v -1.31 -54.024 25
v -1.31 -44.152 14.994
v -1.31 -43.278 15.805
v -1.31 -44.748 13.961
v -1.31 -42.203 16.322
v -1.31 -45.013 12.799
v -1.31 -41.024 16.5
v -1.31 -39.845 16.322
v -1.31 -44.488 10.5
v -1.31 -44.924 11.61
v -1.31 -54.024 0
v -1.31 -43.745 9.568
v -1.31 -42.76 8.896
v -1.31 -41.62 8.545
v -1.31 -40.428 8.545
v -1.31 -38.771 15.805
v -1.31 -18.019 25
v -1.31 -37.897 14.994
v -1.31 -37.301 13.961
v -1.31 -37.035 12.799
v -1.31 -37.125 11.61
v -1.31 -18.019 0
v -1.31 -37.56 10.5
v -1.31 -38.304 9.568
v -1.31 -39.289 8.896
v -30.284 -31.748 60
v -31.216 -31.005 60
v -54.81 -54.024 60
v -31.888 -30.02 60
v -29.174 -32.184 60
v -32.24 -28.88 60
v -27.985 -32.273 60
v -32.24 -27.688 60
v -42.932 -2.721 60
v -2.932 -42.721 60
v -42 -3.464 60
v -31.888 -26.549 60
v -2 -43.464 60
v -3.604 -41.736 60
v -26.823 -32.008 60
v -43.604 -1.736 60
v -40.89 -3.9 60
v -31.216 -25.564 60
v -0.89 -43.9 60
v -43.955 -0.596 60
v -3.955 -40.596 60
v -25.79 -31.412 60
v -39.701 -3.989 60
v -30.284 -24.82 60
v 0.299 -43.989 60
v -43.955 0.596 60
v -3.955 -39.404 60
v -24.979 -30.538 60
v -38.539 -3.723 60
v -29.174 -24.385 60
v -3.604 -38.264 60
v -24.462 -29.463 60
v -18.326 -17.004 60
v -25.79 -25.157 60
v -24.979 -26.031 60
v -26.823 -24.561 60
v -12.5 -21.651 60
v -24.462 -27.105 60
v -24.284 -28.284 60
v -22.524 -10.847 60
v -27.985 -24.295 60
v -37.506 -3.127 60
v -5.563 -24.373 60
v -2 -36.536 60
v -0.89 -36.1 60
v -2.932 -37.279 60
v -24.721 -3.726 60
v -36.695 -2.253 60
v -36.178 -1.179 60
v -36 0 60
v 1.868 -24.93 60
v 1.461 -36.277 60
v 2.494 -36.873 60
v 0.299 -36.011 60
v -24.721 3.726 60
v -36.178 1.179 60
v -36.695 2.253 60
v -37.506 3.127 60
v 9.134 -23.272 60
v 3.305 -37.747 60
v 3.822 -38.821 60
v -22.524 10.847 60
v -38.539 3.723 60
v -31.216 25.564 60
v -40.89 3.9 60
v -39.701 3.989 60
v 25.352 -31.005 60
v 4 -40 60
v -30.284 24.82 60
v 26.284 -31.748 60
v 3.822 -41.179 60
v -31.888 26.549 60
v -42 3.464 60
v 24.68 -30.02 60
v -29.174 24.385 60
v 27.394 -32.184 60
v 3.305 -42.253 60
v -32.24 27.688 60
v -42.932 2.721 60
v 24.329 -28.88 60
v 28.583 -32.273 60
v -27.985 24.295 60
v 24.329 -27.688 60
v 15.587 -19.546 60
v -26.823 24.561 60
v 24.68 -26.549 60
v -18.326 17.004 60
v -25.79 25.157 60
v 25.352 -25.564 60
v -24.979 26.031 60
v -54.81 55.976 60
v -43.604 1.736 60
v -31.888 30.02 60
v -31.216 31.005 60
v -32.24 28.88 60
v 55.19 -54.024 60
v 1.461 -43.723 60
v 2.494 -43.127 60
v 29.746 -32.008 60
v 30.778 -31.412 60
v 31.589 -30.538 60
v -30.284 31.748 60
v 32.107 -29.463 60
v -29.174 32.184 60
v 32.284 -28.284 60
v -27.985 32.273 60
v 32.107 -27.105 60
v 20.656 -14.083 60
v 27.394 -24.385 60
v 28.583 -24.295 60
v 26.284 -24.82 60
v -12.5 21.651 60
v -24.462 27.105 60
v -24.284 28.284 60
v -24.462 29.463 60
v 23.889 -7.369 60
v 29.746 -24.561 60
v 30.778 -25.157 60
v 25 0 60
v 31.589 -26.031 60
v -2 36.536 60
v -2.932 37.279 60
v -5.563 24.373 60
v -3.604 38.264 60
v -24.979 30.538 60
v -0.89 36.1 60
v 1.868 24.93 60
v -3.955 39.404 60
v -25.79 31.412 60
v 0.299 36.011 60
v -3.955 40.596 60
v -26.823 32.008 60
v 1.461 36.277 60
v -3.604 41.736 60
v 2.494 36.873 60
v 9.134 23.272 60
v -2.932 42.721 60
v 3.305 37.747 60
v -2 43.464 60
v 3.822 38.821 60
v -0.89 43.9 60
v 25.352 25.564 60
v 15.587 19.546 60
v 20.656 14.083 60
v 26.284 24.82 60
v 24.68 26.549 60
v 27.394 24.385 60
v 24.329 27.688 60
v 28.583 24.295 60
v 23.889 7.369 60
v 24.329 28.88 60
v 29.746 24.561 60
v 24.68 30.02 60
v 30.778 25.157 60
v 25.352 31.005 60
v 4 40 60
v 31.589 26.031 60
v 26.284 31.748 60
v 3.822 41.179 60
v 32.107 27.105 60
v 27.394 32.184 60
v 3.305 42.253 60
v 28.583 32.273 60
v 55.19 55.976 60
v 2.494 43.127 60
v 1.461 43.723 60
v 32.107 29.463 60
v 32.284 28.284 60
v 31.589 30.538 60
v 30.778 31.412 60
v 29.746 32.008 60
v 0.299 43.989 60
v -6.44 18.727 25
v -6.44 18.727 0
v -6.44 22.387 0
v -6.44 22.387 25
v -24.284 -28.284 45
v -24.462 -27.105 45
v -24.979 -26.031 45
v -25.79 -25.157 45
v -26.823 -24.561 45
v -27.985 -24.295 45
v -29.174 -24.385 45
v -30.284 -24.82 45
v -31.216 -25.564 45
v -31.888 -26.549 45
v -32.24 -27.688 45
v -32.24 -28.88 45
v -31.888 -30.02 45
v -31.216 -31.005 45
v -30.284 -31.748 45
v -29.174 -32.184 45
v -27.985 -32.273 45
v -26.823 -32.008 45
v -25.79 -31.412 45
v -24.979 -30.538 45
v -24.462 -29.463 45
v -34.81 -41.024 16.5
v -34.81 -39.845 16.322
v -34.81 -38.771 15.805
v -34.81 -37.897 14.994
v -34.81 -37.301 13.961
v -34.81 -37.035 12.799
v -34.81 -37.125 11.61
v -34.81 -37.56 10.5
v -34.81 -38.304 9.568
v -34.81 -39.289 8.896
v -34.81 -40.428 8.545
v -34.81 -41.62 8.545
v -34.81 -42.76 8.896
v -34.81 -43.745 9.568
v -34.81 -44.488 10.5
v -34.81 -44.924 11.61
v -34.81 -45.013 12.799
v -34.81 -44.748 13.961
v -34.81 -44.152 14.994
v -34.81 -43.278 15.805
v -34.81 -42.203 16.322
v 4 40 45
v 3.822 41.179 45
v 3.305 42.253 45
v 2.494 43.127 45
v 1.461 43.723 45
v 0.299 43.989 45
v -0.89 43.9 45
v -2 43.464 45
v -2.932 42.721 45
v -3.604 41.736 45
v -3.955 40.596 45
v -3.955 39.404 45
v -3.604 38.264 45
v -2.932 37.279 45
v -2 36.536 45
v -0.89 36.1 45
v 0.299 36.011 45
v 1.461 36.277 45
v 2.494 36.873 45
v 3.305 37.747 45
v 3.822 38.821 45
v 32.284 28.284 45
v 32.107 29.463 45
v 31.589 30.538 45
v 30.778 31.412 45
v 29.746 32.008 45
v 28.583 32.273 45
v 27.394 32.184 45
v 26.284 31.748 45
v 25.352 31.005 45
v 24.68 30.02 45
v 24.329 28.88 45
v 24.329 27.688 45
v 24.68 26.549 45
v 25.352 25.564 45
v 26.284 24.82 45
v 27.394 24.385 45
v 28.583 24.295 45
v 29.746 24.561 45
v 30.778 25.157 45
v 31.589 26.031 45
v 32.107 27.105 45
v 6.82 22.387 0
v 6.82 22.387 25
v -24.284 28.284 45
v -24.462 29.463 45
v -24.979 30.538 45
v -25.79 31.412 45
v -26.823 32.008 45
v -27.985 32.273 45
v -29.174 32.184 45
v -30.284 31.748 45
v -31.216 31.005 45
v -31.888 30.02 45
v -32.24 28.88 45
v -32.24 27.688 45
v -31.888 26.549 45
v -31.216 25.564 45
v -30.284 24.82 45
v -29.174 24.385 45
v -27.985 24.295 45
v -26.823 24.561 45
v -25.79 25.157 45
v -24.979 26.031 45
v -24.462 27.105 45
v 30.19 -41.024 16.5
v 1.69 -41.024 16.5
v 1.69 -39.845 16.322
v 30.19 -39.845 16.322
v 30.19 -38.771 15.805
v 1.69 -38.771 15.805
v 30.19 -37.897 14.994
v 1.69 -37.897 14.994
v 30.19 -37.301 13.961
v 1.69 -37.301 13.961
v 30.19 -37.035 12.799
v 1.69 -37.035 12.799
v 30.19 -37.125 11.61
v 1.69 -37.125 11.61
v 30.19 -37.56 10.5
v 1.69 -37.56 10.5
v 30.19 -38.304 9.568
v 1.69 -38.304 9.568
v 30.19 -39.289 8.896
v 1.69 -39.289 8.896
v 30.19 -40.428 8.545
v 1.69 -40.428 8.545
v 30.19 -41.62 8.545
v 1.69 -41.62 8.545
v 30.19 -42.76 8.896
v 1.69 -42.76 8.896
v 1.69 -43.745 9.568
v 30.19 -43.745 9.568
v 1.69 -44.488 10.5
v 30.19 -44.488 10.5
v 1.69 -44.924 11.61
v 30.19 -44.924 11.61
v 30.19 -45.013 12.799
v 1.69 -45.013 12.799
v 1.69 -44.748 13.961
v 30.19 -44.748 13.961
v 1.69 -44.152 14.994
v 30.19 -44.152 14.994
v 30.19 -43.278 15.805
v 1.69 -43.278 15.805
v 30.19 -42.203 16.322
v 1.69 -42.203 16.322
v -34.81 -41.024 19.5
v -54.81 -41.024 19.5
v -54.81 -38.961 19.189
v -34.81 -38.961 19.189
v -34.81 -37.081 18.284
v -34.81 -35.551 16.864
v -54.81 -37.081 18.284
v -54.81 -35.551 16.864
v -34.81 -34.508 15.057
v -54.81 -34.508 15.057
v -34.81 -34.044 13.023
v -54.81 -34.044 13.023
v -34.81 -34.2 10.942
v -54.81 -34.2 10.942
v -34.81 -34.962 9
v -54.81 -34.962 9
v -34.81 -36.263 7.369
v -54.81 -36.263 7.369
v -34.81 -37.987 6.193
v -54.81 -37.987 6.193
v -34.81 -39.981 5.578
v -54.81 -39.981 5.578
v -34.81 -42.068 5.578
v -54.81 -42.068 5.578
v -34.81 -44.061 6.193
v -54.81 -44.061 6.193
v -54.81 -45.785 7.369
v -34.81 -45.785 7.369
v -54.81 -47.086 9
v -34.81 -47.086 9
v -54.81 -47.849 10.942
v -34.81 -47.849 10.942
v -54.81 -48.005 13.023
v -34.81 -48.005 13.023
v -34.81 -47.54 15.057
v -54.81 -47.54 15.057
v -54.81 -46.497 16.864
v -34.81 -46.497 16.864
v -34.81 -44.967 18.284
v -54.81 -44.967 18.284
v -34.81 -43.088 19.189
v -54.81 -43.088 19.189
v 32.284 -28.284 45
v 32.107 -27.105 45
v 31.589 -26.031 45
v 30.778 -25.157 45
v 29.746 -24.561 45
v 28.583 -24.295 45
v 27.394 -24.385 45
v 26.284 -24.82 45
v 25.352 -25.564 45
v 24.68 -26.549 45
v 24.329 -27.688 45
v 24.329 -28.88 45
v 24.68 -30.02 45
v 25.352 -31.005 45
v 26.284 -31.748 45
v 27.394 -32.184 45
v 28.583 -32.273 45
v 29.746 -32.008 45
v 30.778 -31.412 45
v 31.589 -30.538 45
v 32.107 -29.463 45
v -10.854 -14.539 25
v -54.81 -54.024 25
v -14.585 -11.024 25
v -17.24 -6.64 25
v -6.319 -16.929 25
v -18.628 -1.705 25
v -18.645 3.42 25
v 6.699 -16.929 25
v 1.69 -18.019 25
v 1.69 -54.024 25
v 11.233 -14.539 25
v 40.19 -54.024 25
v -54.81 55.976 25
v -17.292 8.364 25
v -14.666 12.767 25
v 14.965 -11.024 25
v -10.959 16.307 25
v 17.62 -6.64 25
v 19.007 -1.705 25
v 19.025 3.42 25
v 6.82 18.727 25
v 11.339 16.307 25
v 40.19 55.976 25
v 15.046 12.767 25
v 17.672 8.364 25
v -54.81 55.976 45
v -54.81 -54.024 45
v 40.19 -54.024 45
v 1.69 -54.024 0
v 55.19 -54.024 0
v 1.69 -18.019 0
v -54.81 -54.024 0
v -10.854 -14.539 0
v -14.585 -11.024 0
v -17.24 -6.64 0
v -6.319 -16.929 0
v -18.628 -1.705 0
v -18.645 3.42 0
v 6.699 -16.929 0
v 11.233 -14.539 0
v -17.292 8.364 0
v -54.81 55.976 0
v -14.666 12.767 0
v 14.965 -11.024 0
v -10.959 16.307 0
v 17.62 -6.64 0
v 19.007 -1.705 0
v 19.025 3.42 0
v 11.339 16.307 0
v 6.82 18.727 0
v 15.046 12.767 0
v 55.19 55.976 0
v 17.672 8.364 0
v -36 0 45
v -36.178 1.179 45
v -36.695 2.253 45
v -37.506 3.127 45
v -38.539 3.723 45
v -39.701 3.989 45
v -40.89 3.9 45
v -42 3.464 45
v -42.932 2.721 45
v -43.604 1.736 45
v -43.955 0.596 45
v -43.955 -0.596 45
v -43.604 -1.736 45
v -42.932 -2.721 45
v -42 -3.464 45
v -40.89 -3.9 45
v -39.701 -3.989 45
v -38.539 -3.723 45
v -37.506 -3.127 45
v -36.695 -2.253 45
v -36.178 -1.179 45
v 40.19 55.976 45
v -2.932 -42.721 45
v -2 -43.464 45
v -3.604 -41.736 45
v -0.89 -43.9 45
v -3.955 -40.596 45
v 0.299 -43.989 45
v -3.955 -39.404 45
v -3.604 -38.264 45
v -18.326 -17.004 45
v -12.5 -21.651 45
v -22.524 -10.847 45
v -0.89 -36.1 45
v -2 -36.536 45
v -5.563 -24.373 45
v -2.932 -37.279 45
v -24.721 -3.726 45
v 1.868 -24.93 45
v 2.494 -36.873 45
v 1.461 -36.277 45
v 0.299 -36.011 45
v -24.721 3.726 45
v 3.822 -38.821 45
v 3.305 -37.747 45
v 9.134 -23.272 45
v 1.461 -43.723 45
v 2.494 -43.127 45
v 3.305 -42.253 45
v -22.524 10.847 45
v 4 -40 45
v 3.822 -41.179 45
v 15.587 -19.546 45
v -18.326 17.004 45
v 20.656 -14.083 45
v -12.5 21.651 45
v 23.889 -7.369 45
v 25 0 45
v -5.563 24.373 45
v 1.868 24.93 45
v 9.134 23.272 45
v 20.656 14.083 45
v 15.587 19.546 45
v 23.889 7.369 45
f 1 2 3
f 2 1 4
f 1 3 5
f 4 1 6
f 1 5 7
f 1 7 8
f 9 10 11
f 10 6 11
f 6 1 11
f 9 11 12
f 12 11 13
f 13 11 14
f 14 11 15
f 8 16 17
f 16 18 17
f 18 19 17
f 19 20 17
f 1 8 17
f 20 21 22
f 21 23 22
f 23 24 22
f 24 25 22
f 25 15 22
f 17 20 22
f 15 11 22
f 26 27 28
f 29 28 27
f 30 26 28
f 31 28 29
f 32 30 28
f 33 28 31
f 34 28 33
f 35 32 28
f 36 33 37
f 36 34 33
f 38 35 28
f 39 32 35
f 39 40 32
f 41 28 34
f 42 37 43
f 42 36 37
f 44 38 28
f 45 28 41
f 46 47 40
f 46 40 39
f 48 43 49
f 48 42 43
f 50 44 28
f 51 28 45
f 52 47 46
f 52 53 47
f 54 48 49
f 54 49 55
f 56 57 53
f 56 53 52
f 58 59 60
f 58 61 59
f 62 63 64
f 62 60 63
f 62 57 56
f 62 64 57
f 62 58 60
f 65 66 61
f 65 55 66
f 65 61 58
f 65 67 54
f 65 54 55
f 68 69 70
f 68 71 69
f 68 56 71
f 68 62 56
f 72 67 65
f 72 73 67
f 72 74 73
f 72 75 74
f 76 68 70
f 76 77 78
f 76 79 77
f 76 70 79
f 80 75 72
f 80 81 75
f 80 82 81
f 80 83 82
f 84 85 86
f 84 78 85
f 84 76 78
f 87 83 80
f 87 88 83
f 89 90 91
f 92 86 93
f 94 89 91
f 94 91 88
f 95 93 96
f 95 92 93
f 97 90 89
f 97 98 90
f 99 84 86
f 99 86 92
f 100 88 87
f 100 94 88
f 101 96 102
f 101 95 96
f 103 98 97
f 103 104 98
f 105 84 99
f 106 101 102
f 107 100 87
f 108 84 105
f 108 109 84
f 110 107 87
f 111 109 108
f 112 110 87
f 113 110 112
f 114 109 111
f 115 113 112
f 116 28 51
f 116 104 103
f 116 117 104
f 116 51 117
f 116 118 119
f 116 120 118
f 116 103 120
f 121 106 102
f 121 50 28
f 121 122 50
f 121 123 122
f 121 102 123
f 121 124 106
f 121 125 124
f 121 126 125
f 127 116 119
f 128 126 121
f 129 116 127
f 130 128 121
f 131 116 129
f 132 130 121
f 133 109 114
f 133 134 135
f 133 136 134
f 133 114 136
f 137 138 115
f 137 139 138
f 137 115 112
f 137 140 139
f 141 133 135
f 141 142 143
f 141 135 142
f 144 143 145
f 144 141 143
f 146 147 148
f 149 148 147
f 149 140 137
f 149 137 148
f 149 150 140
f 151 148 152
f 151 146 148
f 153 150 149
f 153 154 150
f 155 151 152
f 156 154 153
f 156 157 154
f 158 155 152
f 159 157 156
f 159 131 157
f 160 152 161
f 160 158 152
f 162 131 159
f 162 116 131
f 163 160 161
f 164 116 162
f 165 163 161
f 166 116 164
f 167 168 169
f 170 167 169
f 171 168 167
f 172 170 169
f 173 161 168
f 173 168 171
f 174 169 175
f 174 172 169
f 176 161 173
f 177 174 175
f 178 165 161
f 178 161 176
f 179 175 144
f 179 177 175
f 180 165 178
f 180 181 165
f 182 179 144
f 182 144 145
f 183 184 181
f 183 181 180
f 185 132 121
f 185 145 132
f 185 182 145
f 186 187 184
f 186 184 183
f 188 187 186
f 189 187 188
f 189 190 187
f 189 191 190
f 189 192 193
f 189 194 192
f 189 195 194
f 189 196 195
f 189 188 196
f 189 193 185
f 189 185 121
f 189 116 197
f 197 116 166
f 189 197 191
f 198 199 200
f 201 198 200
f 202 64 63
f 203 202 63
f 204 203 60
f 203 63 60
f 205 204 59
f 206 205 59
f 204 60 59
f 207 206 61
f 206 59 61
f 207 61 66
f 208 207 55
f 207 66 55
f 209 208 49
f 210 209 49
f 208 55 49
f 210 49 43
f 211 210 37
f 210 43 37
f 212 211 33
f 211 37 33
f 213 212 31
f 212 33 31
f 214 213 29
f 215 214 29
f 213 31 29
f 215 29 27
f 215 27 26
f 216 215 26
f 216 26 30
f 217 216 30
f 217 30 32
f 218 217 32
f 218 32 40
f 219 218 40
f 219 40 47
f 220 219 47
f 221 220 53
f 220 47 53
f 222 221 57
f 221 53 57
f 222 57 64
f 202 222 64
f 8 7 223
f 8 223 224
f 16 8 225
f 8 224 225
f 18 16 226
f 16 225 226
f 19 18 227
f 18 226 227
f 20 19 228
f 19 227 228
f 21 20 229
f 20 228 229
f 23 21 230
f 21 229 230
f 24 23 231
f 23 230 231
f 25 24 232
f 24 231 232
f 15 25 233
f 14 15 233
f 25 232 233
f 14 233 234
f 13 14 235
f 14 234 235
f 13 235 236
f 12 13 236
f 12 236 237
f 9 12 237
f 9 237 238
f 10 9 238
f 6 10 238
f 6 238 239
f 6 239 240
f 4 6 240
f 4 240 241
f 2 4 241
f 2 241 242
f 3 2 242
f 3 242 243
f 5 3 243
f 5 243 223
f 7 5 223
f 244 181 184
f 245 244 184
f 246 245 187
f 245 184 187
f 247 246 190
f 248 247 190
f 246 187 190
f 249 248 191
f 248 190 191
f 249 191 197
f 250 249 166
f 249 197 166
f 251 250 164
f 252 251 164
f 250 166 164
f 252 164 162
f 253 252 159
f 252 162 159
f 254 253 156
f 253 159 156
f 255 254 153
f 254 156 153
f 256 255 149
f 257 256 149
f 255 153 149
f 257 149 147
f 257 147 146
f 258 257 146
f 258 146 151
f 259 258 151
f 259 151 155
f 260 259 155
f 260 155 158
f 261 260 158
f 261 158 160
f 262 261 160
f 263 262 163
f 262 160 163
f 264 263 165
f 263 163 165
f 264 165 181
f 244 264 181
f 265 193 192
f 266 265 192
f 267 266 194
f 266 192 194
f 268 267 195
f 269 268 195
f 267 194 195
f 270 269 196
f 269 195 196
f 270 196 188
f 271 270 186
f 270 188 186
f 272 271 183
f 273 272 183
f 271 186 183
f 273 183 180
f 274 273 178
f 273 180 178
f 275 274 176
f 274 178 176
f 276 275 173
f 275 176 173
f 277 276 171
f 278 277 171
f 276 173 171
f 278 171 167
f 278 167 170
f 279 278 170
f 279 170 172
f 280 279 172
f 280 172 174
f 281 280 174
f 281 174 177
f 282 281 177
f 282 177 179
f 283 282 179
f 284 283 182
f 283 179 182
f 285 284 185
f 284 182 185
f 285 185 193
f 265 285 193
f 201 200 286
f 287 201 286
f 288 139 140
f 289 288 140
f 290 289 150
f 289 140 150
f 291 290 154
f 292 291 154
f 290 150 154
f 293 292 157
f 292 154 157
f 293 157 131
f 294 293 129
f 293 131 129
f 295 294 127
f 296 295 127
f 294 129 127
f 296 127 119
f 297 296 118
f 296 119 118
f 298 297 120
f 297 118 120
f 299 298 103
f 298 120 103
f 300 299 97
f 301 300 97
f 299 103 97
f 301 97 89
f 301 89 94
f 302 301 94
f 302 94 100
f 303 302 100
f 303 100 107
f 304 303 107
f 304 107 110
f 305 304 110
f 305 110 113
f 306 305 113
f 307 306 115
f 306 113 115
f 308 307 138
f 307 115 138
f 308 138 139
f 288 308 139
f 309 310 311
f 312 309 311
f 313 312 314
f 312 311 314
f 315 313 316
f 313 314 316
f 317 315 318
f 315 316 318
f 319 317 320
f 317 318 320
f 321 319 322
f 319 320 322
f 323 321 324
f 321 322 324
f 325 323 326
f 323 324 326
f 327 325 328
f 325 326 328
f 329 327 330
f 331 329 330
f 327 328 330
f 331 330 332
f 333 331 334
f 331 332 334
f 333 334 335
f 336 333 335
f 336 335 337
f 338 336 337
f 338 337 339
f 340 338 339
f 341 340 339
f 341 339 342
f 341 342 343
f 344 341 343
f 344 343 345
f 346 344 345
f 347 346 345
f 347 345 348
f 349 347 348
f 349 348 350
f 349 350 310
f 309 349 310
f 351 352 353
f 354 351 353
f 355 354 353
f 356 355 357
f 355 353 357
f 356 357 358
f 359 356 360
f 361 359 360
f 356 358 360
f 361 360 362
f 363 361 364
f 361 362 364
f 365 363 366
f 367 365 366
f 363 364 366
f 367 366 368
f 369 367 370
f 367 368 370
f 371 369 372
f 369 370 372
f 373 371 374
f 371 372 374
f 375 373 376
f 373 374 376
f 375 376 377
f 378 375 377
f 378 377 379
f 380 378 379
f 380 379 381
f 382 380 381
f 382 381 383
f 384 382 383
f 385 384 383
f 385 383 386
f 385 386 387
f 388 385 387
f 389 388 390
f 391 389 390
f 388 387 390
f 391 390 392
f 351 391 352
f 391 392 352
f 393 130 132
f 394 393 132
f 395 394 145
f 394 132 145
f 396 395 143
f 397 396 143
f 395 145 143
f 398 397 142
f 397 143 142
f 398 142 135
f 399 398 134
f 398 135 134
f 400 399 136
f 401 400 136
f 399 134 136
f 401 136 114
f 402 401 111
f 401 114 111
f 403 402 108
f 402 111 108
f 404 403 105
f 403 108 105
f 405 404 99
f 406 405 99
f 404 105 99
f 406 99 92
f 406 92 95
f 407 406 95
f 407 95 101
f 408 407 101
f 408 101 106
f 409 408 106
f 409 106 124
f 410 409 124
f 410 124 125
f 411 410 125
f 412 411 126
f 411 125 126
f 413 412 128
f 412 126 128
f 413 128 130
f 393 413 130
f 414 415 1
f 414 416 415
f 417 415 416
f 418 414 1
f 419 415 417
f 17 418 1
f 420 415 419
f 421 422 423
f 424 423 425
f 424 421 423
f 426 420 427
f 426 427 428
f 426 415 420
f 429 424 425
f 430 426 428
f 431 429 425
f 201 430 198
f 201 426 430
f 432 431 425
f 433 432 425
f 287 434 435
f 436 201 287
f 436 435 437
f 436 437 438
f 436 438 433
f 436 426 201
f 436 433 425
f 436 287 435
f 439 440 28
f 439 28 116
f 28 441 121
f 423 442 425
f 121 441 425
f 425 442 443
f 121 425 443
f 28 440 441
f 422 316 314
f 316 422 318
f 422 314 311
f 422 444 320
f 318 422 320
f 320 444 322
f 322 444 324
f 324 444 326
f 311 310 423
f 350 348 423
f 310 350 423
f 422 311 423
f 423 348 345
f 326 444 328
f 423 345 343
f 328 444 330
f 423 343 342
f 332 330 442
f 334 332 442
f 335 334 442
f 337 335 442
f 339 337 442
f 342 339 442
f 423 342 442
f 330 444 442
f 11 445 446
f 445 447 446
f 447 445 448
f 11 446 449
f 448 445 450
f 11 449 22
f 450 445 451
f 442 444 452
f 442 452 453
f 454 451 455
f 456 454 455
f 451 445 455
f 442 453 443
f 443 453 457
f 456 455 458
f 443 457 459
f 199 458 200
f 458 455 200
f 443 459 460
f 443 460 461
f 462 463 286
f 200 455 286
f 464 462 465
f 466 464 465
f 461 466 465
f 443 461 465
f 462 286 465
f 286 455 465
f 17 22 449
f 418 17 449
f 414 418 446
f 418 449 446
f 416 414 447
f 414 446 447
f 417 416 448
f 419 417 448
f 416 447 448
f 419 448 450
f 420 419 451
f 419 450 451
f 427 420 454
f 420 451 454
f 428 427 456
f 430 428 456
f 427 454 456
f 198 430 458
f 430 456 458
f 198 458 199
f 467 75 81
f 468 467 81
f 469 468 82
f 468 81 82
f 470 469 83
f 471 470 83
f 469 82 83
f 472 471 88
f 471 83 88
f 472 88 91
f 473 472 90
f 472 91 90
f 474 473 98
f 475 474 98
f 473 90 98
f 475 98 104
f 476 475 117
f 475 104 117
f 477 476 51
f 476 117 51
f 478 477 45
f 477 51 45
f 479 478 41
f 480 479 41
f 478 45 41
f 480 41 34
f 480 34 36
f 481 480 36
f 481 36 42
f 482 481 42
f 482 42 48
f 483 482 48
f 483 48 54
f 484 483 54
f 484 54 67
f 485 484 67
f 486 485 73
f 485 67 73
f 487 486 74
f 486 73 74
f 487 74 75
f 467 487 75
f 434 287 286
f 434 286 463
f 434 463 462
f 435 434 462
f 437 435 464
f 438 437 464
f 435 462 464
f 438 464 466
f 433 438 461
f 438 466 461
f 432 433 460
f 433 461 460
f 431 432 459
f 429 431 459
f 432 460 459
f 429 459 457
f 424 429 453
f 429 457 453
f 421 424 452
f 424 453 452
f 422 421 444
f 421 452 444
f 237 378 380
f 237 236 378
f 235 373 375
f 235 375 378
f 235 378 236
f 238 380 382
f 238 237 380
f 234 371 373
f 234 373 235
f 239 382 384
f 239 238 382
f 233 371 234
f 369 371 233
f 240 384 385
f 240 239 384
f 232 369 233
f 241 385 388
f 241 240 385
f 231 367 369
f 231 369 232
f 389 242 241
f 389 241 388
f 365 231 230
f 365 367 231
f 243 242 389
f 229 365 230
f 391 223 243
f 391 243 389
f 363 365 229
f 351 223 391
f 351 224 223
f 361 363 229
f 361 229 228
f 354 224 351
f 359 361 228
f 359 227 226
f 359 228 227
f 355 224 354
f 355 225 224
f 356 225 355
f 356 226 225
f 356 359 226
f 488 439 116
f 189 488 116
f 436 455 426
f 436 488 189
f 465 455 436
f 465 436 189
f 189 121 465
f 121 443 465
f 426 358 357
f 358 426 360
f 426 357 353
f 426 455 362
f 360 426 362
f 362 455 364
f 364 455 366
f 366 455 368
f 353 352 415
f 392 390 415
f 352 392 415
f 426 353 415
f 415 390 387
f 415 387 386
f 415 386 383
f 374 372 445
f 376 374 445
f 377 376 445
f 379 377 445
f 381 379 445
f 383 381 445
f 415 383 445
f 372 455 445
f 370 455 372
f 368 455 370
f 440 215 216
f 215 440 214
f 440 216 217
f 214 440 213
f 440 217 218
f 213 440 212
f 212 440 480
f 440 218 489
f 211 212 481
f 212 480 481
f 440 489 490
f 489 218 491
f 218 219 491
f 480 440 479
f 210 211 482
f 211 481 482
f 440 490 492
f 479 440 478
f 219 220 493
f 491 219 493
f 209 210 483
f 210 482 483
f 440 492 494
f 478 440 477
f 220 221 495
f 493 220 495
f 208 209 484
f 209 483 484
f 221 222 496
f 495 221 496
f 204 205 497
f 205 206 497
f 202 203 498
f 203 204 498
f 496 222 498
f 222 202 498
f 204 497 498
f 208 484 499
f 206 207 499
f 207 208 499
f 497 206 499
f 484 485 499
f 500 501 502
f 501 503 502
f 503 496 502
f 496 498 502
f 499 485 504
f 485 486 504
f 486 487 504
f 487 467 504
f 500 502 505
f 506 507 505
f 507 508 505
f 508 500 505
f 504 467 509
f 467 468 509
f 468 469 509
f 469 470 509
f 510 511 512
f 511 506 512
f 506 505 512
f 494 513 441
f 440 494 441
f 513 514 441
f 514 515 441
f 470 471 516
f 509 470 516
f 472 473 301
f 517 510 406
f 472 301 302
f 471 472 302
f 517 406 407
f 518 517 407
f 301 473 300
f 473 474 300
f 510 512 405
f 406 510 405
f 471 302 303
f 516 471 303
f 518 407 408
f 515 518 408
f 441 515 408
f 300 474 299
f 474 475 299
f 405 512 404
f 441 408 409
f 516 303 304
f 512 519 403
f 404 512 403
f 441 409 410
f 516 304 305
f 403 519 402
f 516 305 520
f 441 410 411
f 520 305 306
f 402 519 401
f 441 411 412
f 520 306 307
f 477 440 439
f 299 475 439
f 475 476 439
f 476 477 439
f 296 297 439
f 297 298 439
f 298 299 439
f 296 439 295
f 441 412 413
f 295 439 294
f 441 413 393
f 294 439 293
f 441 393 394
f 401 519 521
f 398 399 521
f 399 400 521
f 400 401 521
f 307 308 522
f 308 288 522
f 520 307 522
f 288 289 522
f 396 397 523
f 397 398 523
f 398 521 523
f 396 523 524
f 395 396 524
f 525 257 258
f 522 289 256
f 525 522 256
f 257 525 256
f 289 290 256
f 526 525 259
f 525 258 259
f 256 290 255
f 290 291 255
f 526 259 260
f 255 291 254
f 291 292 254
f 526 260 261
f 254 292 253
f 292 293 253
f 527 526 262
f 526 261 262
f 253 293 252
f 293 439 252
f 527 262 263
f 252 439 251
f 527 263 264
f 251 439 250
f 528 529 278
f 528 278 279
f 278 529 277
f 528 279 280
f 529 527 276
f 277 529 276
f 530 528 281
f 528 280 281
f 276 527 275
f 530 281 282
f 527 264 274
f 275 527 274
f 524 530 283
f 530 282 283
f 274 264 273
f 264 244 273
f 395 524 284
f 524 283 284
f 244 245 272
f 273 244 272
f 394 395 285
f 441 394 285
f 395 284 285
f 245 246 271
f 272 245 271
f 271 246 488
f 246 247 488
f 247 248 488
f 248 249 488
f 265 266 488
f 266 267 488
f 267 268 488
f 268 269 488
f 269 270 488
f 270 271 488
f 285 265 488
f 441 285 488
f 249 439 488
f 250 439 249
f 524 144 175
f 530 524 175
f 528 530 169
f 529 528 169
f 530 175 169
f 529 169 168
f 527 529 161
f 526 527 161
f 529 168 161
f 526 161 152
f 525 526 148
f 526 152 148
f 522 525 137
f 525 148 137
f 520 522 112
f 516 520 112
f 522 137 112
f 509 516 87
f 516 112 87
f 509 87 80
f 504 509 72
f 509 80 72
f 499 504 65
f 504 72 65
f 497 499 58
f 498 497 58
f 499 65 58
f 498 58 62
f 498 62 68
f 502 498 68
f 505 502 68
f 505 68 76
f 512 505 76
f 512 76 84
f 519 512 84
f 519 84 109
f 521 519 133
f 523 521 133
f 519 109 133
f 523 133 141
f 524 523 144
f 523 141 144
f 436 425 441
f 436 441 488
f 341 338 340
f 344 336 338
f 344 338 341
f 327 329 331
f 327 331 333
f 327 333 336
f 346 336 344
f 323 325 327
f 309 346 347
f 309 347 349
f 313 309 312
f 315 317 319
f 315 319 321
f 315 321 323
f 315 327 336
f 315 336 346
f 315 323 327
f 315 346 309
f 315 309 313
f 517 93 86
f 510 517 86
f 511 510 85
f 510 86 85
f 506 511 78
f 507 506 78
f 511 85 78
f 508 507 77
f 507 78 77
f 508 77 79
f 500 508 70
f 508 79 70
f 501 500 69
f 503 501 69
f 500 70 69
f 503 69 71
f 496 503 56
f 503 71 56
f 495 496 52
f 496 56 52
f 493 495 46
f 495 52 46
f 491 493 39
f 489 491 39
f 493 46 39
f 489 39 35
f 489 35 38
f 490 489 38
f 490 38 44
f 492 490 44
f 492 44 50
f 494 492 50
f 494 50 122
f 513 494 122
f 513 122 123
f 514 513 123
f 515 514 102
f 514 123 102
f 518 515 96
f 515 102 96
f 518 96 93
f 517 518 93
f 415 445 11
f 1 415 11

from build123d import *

# Parameters (mm, degrees)
RESSALTO_EXTRUS_O2_DEPTH = 25
ESBO_O5_R                = 4
CORTE_EXTRUS_O3_DEPTH    = 85
ESBO_O6_R                = 7
CORTE_EXTRUS_O4_DEPTH    = 20
ESBO_O12_W               = 15
ESBO_O12_H               = 110
RESSALTO_EXTRUS_O3_DEPTH = 20
ESBO_O13_W               = 110
ESBO_O13_H               = 110
RESSALTO_EXTRUS_O4_DEPTH = 15
ESBO_O14_R               = 25
ESBO_O14_R_2             = 4
CORTE_EXTRUS_O5_DEPTH    = 15


with BuildPart() as part:
    # Esboço1 → Ressalto-extrusão2 (new body)
    with BuildSketch(Plane.XY):
        with BuildLine():
            Line((6.820228442, 22.38699838), (6.820228442, 18.727313079))
            ThreePointArc((6.820228442, 18.727313079), (19.00741694, -1.705466141), (1.689928033, -18.018976127))
            Line((1.689928033, -18.018976127), (1.689928033, -54.024230705))
            Line((1.689928033, -54.024230705), (55.189928033, -54.024230705))
            Line((55.189928033, -54.024230705), (55.189928033, 55.975769295))
            Line((55.189928033, 55.975769295), (1.689928033, 55.975769295))
            Line((1.689928033, 55.975769295), (-1.310071967, 55.975769295))
            Line((-1.310071967, 55.975769295), (-54.810071967, 55.975769295))
            Line((-54.810071967, 55.975769295), (-54.810071967, -54.024230705))
            Line((-54.810071967, -54.024230705), (-1.310071967, -54.024230705))
            Line((-1.310071967, -54.024230705), (-1.310071967, -18.018976127))
            ThreePointArc((-1.310071967, -18.018976127), (-18.627560875, -1.705466141), (-6.440372377, 18.727313079))
            Line((-6.440372377, 18.727313079), (-6.440372377, 22.38699838))
            Line((-6.440372377, 22.38699838), (6.180238055, 22.38699838))
            Line((6.180238055, 22.38699838), (6.820228442, 22.38699838))
        make_face()
    extrude(amount=RESSALTO_EXTRUS_O2_DEPTH)

    # Esboço5 → Corte-extrusão3 (cut)
    with BuildSketch(Plane.ZY.offset(54.810071967)):
        with Locations((12.5, -41.024230705)):
            Circle(ESBO_O5_R)
    extrude(amount=-CORTE_EXTRUS_O3_DEPTH, mode=Mode.SUBTRACT)

    # Esboço6 → Corte-extrusão4 (cut)
    with BuildSketch(Plane.ZY.offset(54.810071967)):
        with Locations((12.5, -41.024230705)):
            Circle(ESBO_O6_R)
    extrude(amount=-CORTE_EXTRUS_O4_DEPTH, mode=Mode.SUBTRACT)

    # Esboço12 → Ressalto-extrusão3 (add)
    with BuildSketch(Plane.XY.offset(25)):
        with Locations((47.689928033, 0.975769295)):
            Rectangle(ESBO_O12_W, ESBO_O12_H)
    extrude(amount=RESSALTO_EXTRUS_O3_DEPTH)

    # Esboço13 → Ressalto-extrusão4 (add)
    with BuildSketch(Plane.XY.offset(45)):
        with Locations((0.189928033, 0.975769295)):
            Rectangle(ESBO_O13_W, ESBO_O13_H)
    extrude(amount=RESSALTO_EXTRUS_O4_DEPTH)

    # Esboço14 → Corte-extrusão5 (cut)
    with BuildSketch(Plane.XY.offset(60)):
        Circle(ESBO_O14_R)
        with Locations((0, 40)):
            Circle(ESBO_O14_R_2)
        with Locations((-40, 0)):
            Circle(ESBO_O14_R_2)
        with Locations((0, -40)):
            Circle(ESBO_O14_R_2)
        with Locations((-28.284271247, 28.284271247)):
            Circle(ESBO_O14_R_2)
        with Locations((28.284271247, 28.284271247)):
            Circle(ESBO_O14_R_2)
        with Locations((28.284271247, -28.284271247)):
            Circle(ESBO_O14_R_2)
        with Locations((-28.284271247, -28.284271247)):
            Circle(ESBO_O14_R_2)
    extrude(amount=-CORTE_EXTRUS_O5_DEPTH, mode=Mode.SUBTRACT)


solid = part.part
